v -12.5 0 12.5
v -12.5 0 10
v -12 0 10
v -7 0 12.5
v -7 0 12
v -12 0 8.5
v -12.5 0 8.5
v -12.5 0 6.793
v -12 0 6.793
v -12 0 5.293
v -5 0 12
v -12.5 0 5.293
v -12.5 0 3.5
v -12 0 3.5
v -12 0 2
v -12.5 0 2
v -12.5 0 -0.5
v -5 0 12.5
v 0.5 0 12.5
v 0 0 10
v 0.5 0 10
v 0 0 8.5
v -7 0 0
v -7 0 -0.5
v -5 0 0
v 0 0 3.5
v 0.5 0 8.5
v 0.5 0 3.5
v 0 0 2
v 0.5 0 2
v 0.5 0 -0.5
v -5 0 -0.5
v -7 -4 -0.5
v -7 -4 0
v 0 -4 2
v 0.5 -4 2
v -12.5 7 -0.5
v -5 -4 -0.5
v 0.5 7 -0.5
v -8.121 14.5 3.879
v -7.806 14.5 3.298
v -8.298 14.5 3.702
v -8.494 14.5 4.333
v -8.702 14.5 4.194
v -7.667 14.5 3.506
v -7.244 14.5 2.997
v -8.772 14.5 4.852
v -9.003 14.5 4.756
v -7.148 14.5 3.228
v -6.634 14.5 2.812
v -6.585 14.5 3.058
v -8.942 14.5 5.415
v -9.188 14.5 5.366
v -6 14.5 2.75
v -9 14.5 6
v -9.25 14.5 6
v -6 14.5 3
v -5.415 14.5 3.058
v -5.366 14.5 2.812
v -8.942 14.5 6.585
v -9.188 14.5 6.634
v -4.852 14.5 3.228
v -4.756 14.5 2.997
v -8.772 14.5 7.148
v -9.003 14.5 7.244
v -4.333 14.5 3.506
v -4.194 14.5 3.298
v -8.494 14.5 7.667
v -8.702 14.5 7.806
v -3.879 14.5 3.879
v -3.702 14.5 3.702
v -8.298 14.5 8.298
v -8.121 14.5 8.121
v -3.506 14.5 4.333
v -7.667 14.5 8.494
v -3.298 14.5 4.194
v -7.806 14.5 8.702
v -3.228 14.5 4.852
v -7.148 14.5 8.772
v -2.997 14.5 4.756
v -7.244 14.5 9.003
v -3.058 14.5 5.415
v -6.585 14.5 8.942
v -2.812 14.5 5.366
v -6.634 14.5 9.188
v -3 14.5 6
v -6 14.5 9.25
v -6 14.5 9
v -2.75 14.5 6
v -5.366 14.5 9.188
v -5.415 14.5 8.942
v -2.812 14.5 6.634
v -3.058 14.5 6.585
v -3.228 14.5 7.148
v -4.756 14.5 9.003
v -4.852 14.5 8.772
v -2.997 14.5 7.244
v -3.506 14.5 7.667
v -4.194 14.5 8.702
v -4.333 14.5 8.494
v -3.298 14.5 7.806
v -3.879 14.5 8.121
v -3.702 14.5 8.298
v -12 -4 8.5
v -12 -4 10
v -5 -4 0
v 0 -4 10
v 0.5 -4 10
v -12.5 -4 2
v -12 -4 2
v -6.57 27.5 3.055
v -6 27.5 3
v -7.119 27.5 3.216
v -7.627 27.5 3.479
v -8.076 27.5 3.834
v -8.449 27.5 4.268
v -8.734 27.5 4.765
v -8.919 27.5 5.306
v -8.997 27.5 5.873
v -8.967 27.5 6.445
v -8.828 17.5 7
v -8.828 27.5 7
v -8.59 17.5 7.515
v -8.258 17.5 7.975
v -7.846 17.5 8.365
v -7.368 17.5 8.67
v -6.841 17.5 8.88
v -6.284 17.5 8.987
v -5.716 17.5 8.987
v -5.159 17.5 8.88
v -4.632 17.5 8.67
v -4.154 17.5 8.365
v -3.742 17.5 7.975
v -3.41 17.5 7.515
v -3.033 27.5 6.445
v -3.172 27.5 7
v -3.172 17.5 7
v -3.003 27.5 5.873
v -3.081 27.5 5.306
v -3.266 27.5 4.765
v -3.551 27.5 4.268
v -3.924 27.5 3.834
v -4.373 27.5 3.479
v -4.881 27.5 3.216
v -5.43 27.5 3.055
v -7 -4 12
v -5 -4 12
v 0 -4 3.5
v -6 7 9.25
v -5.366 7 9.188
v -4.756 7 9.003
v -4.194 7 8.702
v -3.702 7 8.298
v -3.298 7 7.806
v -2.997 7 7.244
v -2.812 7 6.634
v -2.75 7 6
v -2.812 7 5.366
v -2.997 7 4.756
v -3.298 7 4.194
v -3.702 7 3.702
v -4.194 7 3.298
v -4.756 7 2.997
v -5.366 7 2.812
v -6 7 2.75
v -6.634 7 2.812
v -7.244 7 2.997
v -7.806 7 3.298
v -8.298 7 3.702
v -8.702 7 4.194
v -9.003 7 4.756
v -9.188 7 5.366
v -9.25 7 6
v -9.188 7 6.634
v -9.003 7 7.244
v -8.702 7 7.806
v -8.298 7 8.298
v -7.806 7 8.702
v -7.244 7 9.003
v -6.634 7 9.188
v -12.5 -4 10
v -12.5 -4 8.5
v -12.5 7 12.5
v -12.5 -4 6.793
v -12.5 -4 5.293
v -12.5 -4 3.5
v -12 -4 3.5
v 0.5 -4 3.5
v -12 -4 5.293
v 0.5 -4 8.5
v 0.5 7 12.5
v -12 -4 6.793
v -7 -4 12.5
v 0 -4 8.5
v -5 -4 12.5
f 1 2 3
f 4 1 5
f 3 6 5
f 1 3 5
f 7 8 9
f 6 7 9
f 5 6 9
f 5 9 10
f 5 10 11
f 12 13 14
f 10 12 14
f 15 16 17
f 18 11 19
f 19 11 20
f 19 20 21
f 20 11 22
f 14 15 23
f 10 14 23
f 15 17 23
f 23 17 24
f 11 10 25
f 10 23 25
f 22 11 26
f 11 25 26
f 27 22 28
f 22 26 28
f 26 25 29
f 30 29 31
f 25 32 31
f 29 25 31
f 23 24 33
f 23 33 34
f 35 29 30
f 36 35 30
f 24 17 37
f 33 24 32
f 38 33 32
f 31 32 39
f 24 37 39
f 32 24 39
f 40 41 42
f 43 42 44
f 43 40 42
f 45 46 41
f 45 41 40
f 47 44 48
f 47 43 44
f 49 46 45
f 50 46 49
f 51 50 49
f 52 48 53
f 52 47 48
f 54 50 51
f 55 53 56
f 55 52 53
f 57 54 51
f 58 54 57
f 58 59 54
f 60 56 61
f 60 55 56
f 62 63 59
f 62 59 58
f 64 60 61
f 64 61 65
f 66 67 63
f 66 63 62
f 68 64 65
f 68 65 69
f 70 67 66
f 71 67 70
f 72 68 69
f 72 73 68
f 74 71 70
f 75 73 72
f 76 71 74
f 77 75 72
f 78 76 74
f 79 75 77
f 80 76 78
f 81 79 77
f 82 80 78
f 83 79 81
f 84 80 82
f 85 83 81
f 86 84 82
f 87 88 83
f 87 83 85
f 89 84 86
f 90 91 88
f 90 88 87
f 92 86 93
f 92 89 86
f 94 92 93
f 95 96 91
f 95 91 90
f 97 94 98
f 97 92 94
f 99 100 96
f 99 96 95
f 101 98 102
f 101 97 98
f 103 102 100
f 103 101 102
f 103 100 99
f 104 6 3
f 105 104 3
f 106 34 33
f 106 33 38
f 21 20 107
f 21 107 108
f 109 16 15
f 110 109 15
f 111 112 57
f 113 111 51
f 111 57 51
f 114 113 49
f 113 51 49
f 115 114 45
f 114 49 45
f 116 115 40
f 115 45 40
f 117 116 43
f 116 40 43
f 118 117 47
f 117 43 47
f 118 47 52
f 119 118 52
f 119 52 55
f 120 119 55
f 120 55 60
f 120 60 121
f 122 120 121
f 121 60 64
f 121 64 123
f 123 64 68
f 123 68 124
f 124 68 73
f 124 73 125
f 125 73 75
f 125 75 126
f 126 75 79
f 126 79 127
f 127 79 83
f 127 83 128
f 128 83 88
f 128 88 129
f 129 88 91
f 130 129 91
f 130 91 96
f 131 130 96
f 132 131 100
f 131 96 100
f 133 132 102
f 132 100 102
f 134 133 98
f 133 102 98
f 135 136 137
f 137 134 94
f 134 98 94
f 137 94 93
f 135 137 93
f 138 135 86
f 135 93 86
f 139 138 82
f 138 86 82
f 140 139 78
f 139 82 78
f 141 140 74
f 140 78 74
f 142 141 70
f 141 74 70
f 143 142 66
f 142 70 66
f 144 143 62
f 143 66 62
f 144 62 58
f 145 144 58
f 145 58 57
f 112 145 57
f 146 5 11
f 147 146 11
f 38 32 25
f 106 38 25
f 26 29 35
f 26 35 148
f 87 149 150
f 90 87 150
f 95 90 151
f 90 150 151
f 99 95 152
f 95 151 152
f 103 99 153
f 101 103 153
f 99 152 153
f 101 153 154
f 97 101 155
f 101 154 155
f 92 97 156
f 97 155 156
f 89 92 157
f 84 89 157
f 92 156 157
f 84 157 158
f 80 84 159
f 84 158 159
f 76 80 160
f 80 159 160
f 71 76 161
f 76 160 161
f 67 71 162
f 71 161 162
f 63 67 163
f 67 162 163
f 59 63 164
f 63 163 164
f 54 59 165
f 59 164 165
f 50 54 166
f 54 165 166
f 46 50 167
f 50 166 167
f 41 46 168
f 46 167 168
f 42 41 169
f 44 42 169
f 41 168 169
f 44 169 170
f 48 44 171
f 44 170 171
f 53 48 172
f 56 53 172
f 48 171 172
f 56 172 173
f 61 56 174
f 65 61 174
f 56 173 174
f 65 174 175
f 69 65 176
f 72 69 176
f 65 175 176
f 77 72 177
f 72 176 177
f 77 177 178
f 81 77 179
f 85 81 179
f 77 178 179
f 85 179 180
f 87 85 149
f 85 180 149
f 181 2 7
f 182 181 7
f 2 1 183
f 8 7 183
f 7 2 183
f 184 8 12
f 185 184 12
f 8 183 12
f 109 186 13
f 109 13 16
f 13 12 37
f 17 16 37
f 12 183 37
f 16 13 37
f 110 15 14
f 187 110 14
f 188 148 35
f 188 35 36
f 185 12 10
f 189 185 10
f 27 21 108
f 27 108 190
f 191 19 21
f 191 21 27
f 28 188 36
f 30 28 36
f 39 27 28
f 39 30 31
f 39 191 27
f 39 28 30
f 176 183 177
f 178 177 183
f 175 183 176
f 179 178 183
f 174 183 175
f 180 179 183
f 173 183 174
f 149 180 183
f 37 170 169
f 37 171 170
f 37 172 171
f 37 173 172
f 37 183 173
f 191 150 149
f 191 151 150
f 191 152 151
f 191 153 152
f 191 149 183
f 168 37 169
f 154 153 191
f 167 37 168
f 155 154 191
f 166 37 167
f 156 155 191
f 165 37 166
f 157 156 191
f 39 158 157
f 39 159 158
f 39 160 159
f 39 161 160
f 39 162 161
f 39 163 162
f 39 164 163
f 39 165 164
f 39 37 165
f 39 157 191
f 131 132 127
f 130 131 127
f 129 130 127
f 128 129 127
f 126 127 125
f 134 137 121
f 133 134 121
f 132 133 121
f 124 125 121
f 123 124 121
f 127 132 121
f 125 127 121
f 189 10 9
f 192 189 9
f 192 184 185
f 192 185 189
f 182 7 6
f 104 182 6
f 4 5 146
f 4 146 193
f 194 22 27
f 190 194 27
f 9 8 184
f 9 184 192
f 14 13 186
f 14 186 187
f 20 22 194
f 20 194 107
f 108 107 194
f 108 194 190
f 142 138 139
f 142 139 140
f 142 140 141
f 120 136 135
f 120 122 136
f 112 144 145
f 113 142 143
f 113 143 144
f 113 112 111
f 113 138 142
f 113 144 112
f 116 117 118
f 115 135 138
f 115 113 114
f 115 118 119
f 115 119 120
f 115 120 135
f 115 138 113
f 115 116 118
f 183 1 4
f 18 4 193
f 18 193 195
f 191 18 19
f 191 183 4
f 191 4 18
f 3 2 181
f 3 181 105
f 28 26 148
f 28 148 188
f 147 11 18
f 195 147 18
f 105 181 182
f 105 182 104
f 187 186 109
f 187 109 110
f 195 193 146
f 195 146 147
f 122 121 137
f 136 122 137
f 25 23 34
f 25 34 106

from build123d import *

# Parameters (mm, degrees)
SKETCH1_W             = 12
SKETCH1_H             = 12
BOSS_EXTRUDE1_DEPTH   = 7
SKETCH2_W             = 0.5
SKETCH2_H             = 1.5
BOSS_EXTRUDE2_DEPTH   = 4
SKETCH2_W_2           = 2
SKETCH2_H_2           = 0.5
BOSS_EXTRUDE2_2_DEPTH = 4
BOSS_EXTRUDE2_3_DEPTH = 4
BOSS_EXTRUDE2_4_DEPTH = 4
BOSS_EXTRUDE2_5_DEPTH = 4
BOSS_EXTRUDE2_6_DEPTH = 4
BOSS_EXTRUDE2_7_DEPTH = 4
SKETCH3_W             = 13
SKETCH3_H             = 13
SKETCH3_W_2           = 12
SKETCH3_H_2           = 12
BOSS_EXTRUDE3_DEPTH   = 7
SKETCH4_R             = 3.25
BOSS_EXTRUDE4_DEPTH   = 7.5
SKETCH5_R             = 3
BOSS_EXTRUDE5_DEPTH   = 13
CUT_EXTRUDE1_START    = -10
CUT_EXTRUDE1_DEPTH    = 10


with BuildPart() as part:
    # Sketch1 → Boss-Extrude1 (new body)
    with BuildSketch(Plane(origin=(0, 0, 0), x_dir=(1, 0, 0), z_dir=(0, 1, 0))):
        with Locations((-6, -6)):
            Rectangle(SKETCH1_W, SKETCH1_H)
    extrude(amount=BOSS_EXTRUDE1_DEPTH)



with BuildPart() as body_2:
    # Sketch2 → Boss-Extrude2 (new body)
    with BuildSketch(Plane.XZ):
        with Locations((-12.25, 9.25)):
            Rectangle(SKETCH2_W, SKETCH2_H)
    extrude(amount=BOSS_EXTRUDE2_DEPTH)


with BuildPart() as body_3:
    # Sketch2 → Boss-Extrude2 2 (new body)
    with BuildSketch(Plane.XZ):
        with Locations((-6, -0.25)):
            Rectangle(SKETCH2_W_2, SKETCH2_H_2)
    extrude(amount=BOSS_EXTRUDE2_2_DEPTH)


with BuildPart() as body_4:
    # Sketch2 → Boss-Extrude2 3 (new body)
    with BuildSketch(Plane.XZ):
        with Locations((0.25, 2.75)):
            Rectangle(SKETCH2_W, SKETCH2_H)
    extrude(amount=BOSS_EXTRUDE2_3_DEPTH)


with BuildPart() as body_5:
    # Sketch2 → Boss-Extrude2 4 (new body)
    with BuildSketch(Plane.XZ):
        with Locations((-6, 12.25)):
            Rectangle(SKETCH2_W_2, SKETCH2_H_2)
    extrude(amount=BOSS_EXTRUDE2_4_DEPTH)


with BuildPart() as body_6:
    # Sketch2 → Boss-Extrude2 5 (new body)
    with BuildSketch(Plane.XZ):
        with Locations((-12.25, 6.043)):
            Rectangle(SKETCH2_W, SKETCH2_H)
    extrude(amount=BOSS_EXTRUDE2_5_DEPTH)


with BuildPart() as body_7:
    # Sketch2 → Boss-Extrude2 6 (new body)
    with BuildSketch(Plane.XZ):
        with Locations((-12.25, 2.75)):
            Rectangle(SKETCH2_W, SKETCH2_H)
    extrude(amount=BOSS_EXTRUDE2_6_DEPTH)


with BuildPart() as body_8:
    # Sketch2 → Boss-Extrude2 7 (new body)
    with BuildSketch(Plane.XZ):
        with Locations((0.25, 9.25)):
            Rectangle(SKETCH2_W, SKETCH2_H)
    extrude(amount=BOSS_EXTRUDE2_7_DEPTH)


with BuildPart() as part_1:
    add(part.part)

    add(body_2.part)  # Boss-Extrude3 merges body 2

    add(body_3.part)  # Boss-Extrude3 merges body 3

    add(body_4.part)  # Boss-Extrude3 merges body 4

    add(body_5.part)  # Boss-Extrude3 merges body 5

    add(body_6.part)  # Boss-Extrude3 merges body 6

    add(body_7.part)  # Boss-Extrude3 merges body 7

    add(body_8.part)  # Boss-Extrude3 merges body 8
    # Sketch3 → Boss-Extrude3 (add)
    with BuildSketch(Plane(origin=(0, 7, 0), x_dir=(1, 0, 0), z_dir=(0, 1, 0))):
        with Locations((-6, -6)):
            Rectangle(SKETCH3_W, SKETCH3_H)
        with Locations((-6, -6)):
            Rectangle(SKETCH3_W_2, SKETCH3_H_2, mode=Mode.SUBTRACT)
    extrude(amount=-BOSS_EXTRUDE3_DEPTH)

    # Sketch4 → Boss-Extrude4 (add)
    with BuildSketch(Plane(origin=(0, 7, 0), x_dir=(1, 0, 0), z_dir=(0, 1, 0))):
        with Locations(Location((-6, -6, 0), (0, 0, 270))):
            Circle(SKETCH4_R)
    extrude(amount=BOSS_EXTRUDE4_DEPTH)

    # Sketch5 → Boss-Extrude5 (add)
    with BuildSketch(Plane(origin=(0, 14.5, 0), x_dir=(1, 0, 0), z_dir=(0, 1, 0))):
        with Locations(Location((-6, -6, 0), (0, 0, 90))):
            Circle(SKETCH5_R)
    extrude(amount=BOSS_EXTRUDE5_DEPTH)

    # Sketch6 → Cut-Extrude1 (cut)
    with BuildSketch(Plane(origin=(0, 27.5, 0), x_dir=(1, 0, 0), z_dir=(0, 1, 0)).offset(CUT_EXTRUDE1_START)):
        with BuildLine():
            Line((-8.828427125, -7), (-3.171572875, -7))
            ThreePointArc((-3.171572875, -7), (-6, -9), (-8.828427125, -7))
        make_face()
    extrude(amount=CUT_EXTRUDE1_DEPTH, mode=Mode.SUBTRACT)


solid = part_1.part
